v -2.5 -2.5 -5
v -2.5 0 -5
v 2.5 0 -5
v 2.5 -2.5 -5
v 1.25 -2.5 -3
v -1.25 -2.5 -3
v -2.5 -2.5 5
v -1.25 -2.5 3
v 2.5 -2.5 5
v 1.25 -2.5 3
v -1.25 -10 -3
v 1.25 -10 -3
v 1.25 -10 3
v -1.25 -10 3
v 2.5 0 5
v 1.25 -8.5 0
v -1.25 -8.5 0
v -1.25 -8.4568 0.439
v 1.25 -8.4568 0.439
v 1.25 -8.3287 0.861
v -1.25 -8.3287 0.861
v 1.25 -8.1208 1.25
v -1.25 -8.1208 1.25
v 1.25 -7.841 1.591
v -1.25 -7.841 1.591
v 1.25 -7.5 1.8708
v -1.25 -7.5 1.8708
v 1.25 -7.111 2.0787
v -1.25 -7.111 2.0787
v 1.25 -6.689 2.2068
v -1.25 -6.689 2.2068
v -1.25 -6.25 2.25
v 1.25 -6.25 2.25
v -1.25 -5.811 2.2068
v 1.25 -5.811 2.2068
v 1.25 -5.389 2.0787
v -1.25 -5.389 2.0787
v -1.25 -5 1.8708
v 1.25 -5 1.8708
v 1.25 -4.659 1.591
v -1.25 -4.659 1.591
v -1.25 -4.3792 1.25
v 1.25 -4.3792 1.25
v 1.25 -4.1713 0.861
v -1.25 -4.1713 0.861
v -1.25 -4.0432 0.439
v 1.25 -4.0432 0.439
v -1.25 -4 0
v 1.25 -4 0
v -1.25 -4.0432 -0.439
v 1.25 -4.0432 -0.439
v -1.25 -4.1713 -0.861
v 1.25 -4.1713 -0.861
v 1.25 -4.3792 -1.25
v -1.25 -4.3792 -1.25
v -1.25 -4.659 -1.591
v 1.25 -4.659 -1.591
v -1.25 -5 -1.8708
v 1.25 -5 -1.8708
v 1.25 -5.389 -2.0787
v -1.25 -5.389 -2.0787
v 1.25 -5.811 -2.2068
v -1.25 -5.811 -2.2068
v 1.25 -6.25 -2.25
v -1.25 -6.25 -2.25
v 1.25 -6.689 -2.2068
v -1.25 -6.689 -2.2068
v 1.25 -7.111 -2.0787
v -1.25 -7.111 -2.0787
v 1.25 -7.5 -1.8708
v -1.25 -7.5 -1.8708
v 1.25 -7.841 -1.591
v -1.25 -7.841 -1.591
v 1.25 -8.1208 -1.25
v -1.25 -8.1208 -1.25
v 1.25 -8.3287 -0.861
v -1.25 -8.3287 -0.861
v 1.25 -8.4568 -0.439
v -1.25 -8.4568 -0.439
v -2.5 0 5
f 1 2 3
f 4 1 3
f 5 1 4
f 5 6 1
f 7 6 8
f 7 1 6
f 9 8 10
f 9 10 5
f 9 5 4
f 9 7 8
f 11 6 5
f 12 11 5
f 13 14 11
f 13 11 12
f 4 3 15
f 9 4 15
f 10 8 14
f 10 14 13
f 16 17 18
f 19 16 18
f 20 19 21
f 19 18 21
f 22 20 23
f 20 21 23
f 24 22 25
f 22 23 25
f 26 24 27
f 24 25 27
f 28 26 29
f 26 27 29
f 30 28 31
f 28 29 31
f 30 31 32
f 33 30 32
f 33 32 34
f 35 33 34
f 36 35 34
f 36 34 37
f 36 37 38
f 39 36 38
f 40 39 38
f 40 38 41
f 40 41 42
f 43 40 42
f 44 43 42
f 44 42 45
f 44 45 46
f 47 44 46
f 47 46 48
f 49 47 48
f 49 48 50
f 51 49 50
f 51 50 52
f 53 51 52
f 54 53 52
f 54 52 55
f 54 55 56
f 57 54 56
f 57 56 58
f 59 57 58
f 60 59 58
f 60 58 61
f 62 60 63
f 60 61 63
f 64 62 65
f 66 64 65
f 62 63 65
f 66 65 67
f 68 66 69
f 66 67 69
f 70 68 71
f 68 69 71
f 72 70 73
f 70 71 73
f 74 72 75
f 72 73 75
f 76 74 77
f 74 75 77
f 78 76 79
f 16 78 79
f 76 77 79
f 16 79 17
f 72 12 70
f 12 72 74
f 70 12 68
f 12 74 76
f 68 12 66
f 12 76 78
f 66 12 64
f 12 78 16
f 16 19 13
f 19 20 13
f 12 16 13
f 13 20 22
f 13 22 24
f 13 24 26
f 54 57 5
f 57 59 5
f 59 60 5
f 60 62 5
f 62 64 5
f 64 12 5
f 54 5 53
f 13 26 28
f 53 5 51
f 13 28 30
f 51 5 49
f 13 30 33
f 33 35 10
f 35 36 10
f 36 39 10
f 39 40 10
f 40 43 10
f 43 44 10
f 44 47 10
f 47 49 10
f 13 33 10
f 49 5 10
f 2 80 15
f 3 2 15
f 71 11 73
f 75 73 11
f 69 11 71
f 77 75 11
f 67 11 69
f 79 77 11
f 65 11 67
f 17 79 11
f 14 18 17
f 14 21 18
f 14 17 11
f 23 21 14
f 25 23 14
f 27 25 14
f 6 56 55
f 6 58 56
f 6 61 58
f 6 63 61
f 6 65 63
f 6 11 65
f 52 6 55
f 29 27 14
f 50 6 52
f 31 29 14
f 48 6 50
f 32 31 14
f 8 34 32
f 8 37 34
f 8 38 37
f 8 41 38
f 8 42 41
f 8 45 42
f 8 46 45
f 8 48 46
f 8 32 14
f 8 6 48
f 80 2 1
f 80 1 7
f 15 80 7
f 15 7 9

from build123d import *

# Parameters (mm, degrees)
F0_W     = 5
F0_H     = 10
F1_DEPTH = 2.5
F2_W     = 2.5
F2_H     = 6
F3_DEPTH = 7.5
F4_R     = 2.25
F5_DEPTH = 3.44


with BuildPart() as f1:
    # F0 (on Front) → F1 (new body)
    with BuildSketch(Plane.XZ):
        Rectangle(F0_W, F0_H)
    extrude(amount=F1_DEPTH)

    # F2 (on face) → F3 (join)
    with BuildSketch(Plane.XZ.offset(2.5)):
        Rectangle(F2_W, F2_H)
    extrude(amount=F3_DEPTH)

    # F4 (on face) → F5 (cut)
    with BuildSketch(Plane(origin=(-1.25, 0, 0), x_dir=(0, -1, 0), z_dir=(-1, 0, 0))):
        with Locations((6.25, 0)):
            Circle(F4_R)
    extrude(amount=-F5_DEPTH, mode=Mode.SUBTRACT)


solid = f1.part
